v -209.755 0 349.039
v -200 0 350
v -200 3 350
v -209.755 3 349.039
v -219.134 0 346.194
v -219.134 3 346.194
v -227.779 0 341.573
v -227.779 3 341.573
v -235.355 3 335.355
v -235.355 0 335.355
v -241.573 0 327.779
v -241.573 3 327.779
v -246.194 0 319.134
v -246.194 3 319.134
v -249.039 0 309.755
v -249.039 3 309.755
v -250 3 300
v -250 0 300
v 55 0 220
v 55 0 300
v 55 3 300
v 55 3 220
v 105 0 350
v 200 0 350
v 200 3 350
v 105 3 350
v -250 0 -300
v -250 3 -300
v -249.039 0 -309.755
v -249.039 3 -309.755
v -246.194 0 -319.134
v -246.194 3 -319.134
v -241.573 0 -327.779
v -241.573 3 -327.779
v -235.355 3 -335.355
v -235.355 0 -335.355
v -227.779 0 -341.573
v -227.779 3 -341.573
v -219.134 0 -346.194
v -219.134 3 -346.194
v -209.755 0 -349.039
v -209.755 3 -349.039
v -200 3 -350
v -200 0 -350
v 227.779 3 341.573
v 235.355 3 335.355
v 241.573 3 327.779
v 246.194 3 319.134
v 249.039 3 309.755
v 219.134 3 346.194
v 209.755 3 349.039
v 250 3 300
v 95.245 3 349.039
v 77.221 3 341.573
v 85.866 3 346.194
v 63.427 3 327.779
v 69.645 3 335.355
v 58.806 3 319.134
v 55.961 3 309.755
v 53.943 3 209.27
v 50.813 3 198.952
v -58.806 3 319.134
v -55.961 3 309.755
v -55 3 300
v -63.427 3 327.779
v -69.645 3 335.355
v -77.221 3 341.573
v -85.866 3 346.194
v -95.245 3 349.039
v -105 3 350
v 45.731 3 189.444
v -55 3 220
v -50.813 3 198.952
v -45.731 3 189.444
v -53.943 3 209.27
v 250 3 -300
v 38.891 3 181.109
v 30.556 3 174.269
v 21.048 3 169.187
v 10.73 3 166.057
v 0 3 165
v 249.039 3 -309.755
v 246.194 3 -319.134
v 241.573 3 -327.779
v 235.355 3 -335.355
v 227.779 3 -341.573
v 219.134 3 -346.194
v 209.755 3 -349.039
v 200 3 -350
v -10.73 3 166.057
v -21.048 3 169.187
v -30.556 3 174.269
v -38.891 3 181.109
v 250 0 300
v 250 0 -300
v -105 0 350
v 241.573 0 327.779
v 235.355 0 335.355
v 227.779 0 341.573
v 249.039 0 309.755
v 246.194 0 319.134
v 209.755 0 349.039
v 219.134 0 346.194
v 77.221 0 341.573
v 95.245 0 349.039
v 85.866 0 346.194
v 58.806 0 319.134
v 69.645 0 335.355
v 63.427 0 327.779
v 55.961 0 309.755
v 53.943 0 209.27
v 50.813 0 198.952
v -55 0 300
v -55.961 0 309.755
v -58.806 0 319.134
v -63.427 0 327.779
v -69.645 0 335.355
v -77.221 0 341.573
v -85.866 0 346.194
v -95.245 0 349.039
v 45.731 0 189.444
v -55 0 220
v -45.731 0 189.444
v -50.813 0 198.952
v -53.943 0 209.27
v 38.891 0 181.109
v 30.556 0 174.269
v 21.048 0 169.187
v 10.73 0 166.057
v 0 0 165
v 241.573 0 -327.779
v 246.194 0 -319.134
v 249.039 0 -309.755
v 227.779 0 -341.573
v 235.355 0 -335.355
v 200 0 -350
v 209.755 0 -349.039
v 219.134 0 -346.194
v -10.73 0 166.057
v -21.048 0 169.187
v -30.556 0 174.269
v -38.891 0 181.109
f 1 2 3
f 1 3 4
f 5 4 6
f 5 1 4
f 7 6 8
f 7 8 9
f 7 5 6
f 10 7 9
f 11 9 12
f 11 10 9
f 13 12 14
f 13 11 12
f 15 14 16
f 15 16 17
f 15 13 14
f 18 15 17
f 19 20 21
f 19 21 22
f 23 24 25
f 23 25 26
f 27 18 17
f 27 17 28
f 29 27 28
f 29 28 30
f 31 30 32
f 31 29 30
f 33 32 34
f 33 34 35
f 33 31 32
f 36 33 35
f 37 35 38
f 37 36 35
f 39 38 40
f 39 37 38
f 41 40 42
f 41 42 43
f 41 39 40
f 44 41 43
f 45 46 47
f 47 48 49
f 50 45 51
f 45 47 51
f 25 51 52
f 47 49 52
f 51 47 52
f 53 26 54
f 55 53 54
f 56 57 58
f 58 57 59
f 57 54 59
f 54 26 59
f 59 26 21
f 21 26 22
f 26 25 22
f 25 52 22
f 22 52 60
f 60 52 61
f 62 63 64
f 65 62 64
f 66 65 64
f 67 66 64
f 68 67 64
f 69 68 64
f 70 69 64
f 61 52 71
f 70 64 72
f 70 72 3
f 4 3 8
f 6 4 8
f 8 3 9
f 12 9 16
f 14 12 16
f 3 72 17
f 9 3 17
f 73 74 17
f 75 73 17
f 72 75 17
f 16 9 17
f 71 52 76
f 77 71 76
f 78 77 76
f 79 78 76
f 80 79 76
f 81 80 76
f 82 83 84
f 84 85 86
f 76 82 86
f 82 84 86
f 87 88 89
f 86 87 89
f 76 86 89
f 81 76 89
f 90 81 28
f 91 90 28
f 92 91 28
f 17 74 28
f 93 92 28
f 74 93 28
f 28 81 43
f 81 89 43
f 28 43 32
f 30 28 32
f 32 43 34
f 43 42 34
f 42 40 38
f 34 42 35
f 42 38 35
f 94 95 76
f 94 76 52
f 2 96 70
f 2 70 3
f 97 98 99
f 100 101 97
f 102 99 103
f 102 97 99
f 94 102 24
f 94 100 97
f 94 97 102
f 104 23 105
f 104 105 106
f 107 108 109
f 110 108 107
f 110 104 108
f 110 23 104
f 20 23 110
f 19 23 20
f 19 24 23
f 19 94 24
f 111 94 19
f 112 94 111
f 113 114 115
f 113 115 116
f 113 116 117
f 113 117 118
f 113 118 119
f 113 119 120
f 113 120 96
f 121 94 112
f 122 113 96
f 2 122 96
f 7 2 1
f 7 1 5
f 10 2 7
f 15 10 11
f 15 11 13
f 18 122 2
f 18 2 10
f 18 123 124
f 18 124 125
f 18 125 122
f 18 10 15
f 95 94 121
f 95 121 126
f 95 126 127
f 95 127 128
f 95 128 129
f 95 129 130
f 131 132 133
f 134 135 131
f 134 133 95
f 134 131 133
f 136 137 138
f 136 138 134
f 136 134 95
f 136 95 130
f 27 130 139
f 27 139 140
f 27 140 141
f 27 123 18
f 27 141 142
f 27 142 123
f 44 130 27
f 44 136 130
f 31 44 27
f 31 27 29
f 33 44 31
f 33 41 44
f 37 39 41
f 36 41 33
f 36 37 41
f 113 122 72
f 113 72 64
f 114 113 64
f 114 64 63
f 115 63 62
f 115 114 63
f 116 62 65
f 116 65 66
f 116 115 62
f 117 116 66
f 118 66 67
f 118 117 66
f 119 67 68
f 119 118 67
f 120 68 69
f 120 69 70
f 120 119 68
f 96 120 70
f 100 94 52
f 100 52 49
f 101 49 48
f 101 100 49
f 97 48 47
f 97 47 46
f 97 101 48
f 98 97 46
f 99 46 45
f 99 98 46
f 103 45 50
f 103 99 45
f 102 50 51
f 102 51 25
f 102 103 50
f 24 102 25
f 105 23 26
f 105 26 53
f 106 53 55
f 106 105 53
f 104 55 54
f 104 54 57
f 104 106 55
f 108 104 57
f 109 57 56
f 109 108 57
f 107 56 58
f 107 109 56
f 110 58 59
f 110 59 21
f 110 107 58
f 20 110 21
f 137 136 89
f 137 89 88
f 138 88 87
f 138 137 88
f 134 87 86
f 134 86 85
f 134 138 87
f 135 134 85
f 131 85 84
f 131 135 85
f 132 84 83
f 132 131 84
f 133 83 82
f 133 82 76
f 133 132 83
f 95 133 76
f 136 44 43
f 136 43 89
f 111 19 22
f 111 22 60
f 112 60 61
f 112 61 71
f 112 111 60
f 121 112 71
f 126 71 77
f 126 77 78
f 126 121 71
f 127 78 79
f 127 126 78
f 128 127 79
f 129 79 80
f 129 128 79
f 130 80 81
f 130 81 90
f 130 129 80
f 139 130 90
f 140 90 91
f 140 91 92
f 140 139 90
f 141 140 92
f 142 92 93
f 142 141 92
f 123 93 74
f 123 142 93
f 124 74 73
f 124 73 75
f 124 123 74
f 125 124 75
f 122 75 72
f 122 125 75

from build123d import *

# Parameters (mm, degrees)
EXTRUDE_1_DEPTH = 3


with BuildPart() as part:
    # 草图1 → 凸台-拉伸1 (new body)
    with BuildSketch(Plane(origin=(0, 0, 0), x_dir=(1, 0, 0), z_dir=(0, 1, 0))):
        with BuildLine():
            Line((-55, -220), (-55, -300))
            ThreePointArc((-55, -300), (-69.644660941, -335.355339059), (-105, -350))
            Line((-105, -350), (-200, -350))
            ThreePointArc((-200, -350), (-235.355339059, -335.355339059), (-250, -300))
            Line((-250, -300), (-250, 300))
            ThreePointArc((-250, 300), (-235.355339059, 335.355339059), (-200, 350))
            Line((-200, 350), (200, 350))
            ThreePointArc((200, 350), (235.355339059, 335.355339059), (250, 300))
            Line((250, 300), (250, -300))
            ThreePointArc((250, -300), (235.355339059, -335.355339059), (200, -350))
            Line((200, -350), (105, -350))
            ThreePointArc((105, -350), (69.644660941, -335.355339059), (55, -300))
            Line((55, -300), (55, -220))
            ThreePointArc((55, -220), (0, -165), (-55, -220))
        make_face()
    extrude(amount=EXTRUDE_1_DEPTH)


solid = part.part
